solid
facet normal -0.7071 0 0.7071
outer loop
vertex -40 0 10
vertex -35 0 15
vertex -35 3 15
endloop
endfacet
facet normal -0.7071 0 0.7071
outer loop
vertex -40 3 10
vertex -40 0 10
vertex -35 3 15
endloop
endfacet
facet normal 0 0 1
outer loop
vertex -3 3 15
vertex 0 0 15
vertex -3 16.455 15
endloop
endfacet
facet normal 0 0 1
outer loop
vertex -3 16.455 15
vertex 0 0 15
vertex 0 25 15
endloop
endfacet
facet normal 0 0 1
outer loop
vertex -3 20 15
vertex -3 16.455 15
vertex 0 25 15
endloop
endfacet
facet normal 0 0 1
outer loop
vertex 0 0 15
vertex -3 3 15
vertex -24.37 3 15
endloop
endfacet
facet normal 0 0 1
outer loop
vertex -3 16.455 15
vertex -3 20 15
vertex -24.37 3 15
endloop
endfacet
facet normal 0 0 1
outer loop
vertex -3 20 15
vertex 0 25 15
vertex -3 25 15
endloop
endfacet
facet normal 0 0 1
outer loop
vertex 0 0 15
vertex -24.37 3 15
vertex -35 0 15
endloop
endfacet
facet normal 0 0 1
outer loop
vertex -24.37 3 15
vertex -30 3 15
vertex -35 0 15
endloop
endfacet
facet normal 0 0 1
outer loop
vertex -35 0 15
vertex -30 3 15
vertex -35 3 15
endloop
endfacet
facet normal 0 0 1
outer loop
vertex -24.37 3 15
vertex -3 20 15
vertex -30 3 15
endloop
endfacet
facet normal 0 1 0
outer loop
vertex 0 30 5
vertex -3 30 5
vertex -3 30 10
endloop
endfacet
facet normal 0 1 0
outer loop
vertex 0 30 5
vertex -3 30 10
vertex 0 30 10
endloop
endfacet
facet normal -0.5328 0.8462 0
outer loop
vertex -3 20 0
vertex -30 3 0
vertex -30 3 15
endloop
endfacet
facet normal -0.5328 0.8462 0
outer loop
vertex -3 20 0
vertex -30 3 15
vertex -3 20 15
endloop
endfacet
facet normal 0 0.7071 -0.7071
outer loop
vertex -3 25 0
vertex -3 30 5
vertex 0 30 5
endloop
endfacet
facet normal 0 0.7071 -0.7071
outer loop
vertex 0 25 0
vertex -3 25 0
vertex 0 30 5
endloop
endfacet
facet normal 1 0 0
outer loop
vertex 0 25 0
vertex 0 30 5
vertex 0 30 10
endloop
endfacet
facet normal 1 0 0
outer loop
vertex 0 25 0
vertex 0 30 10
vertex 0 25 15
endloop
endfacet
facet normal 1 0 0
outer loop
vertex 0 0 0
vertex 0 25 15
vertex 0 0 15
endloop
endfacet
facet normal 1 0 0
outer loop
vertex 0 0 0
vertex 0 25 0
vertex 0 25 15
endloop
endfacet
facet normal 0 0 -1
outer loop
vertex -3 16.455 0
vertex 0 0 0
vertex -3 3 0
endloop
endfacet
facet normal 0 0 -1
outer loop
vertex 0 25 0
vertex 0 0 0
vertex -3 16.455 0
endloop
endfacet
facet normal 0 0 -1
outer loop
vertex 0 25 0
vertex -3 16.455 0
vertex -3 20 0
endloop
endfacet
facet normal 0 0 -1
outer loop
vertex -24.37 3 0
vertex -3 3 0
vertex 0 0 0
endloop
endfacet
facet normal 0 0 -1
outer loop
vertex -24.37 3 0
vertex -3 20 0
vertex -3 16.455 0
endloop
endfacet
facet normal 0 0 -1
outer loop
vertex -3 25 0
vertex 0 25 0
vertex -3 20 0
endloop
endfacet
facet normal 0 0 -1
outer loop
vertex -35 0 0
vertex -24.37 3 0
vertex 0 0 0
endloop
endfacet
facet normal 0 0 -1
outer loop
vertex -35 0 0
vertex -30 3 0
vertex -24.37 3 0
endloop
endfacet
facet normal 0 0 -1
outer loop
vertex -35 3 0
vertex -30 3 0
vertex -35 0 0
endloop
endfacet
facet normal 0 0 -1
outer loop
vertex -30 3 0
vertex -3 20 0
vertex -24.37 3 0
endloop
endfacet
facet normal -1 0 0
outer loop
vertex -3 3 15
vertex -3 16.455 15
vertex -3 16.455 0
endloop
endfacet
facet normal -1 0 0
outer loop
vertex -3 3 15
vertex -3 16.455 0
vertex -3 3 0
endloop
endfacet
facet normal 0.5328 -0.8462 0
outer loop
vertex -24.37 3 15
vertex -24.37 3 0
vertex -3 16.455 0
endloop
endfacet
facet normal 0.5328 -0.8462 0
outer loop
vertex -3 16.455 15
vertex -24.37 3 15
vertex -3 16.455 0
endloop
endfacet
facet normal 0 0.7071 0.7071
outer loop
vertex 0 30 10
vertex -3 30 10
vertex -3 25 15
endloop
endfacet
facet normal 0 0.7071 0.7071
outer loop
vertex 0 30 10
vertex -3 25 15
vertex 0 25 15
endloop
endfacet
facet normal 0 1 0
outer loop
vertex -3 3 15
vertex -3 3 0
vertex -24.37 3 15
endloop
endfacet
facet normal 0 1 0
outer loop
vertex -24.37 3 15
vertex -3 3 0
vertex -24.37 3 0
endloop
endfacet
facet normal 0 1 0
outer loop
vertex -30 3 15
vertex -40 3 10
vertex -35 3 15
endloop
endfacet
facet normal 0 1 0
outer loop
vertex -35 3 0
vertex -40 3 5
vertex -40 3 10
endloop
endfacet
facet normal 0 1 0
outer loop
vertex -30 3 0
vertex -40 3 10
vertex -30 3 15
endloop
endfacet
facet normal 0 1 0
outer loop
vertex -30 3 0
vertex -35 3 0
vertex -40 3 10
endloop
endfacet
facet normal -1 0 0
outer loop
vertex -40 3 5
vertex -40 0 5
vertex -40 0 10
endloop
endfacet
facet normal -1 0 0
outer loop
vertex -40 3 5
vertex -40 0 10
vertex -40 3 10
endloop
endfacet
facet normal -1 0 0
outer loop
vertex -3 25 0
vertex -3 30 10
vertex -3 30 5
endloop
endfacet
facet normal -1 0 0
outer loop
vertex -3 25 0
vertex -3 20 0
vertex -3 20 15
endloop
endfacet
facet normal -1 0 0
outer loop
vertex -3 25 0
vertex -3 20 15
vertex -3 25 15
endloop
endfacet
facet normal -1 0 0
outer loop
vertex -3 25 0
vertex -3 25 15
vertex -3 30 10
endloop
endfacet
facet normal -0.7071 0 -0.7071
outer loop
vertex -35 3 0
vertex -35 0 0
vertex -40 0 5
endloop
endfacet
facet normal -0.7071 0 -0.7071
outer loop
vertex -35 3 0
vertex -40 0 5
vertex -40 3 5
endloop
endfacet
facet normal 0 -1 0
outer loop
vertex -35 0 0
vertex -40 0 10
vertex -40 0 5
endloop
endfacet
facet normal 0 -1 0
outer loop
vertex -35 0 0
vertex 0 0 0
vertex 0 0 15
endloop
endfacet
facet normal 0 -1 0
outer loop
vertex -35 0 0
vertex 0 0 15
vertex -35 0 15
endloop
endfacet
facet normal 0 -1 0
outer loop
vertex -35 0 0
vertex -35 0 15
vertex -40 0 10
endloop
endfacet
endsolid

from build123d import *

# Parameters (mm, degrees)
PAD_DEPTH       = 15
CHAMFER_SIZE    = 5
CHAMFER001_SIZE = 5


with BuildPart() as part:
    # Sketch → Pad (new body)
    with BuildSketch(Plane.XY):
        Polygon((0, 0), (-40, 0), (-40, 3), (-30, 3), (-3, 20), (-3, 30), (0, 30), align=None)
        Polygon((-3, 3), (-24.36951, 3), (-3, 16.454876), align=None, mode=Mode.SUBTRACT)
    extrude(amount=PAD_DEPTH)

    # Chamfer
    chamfer_edges = [part.edges().sort_by_distance(p)[0] for p in [
        (-40, 1.5, 0),
        (-40, 1.5, 15),
    ]]
    chamfer(chamfer_edges, length=CHAMFER_SIZE)

    # Chamfer001
    chamfer001_edges = [part.edges().sort_by_distance(p)[0] for p in [
        (-1.5, 30, 0),
        (-1.5, 30, 15),
    ]]
    chamfer(chamfer001_edges, length=CHAMFER001_SIZE)


solid = part.part
